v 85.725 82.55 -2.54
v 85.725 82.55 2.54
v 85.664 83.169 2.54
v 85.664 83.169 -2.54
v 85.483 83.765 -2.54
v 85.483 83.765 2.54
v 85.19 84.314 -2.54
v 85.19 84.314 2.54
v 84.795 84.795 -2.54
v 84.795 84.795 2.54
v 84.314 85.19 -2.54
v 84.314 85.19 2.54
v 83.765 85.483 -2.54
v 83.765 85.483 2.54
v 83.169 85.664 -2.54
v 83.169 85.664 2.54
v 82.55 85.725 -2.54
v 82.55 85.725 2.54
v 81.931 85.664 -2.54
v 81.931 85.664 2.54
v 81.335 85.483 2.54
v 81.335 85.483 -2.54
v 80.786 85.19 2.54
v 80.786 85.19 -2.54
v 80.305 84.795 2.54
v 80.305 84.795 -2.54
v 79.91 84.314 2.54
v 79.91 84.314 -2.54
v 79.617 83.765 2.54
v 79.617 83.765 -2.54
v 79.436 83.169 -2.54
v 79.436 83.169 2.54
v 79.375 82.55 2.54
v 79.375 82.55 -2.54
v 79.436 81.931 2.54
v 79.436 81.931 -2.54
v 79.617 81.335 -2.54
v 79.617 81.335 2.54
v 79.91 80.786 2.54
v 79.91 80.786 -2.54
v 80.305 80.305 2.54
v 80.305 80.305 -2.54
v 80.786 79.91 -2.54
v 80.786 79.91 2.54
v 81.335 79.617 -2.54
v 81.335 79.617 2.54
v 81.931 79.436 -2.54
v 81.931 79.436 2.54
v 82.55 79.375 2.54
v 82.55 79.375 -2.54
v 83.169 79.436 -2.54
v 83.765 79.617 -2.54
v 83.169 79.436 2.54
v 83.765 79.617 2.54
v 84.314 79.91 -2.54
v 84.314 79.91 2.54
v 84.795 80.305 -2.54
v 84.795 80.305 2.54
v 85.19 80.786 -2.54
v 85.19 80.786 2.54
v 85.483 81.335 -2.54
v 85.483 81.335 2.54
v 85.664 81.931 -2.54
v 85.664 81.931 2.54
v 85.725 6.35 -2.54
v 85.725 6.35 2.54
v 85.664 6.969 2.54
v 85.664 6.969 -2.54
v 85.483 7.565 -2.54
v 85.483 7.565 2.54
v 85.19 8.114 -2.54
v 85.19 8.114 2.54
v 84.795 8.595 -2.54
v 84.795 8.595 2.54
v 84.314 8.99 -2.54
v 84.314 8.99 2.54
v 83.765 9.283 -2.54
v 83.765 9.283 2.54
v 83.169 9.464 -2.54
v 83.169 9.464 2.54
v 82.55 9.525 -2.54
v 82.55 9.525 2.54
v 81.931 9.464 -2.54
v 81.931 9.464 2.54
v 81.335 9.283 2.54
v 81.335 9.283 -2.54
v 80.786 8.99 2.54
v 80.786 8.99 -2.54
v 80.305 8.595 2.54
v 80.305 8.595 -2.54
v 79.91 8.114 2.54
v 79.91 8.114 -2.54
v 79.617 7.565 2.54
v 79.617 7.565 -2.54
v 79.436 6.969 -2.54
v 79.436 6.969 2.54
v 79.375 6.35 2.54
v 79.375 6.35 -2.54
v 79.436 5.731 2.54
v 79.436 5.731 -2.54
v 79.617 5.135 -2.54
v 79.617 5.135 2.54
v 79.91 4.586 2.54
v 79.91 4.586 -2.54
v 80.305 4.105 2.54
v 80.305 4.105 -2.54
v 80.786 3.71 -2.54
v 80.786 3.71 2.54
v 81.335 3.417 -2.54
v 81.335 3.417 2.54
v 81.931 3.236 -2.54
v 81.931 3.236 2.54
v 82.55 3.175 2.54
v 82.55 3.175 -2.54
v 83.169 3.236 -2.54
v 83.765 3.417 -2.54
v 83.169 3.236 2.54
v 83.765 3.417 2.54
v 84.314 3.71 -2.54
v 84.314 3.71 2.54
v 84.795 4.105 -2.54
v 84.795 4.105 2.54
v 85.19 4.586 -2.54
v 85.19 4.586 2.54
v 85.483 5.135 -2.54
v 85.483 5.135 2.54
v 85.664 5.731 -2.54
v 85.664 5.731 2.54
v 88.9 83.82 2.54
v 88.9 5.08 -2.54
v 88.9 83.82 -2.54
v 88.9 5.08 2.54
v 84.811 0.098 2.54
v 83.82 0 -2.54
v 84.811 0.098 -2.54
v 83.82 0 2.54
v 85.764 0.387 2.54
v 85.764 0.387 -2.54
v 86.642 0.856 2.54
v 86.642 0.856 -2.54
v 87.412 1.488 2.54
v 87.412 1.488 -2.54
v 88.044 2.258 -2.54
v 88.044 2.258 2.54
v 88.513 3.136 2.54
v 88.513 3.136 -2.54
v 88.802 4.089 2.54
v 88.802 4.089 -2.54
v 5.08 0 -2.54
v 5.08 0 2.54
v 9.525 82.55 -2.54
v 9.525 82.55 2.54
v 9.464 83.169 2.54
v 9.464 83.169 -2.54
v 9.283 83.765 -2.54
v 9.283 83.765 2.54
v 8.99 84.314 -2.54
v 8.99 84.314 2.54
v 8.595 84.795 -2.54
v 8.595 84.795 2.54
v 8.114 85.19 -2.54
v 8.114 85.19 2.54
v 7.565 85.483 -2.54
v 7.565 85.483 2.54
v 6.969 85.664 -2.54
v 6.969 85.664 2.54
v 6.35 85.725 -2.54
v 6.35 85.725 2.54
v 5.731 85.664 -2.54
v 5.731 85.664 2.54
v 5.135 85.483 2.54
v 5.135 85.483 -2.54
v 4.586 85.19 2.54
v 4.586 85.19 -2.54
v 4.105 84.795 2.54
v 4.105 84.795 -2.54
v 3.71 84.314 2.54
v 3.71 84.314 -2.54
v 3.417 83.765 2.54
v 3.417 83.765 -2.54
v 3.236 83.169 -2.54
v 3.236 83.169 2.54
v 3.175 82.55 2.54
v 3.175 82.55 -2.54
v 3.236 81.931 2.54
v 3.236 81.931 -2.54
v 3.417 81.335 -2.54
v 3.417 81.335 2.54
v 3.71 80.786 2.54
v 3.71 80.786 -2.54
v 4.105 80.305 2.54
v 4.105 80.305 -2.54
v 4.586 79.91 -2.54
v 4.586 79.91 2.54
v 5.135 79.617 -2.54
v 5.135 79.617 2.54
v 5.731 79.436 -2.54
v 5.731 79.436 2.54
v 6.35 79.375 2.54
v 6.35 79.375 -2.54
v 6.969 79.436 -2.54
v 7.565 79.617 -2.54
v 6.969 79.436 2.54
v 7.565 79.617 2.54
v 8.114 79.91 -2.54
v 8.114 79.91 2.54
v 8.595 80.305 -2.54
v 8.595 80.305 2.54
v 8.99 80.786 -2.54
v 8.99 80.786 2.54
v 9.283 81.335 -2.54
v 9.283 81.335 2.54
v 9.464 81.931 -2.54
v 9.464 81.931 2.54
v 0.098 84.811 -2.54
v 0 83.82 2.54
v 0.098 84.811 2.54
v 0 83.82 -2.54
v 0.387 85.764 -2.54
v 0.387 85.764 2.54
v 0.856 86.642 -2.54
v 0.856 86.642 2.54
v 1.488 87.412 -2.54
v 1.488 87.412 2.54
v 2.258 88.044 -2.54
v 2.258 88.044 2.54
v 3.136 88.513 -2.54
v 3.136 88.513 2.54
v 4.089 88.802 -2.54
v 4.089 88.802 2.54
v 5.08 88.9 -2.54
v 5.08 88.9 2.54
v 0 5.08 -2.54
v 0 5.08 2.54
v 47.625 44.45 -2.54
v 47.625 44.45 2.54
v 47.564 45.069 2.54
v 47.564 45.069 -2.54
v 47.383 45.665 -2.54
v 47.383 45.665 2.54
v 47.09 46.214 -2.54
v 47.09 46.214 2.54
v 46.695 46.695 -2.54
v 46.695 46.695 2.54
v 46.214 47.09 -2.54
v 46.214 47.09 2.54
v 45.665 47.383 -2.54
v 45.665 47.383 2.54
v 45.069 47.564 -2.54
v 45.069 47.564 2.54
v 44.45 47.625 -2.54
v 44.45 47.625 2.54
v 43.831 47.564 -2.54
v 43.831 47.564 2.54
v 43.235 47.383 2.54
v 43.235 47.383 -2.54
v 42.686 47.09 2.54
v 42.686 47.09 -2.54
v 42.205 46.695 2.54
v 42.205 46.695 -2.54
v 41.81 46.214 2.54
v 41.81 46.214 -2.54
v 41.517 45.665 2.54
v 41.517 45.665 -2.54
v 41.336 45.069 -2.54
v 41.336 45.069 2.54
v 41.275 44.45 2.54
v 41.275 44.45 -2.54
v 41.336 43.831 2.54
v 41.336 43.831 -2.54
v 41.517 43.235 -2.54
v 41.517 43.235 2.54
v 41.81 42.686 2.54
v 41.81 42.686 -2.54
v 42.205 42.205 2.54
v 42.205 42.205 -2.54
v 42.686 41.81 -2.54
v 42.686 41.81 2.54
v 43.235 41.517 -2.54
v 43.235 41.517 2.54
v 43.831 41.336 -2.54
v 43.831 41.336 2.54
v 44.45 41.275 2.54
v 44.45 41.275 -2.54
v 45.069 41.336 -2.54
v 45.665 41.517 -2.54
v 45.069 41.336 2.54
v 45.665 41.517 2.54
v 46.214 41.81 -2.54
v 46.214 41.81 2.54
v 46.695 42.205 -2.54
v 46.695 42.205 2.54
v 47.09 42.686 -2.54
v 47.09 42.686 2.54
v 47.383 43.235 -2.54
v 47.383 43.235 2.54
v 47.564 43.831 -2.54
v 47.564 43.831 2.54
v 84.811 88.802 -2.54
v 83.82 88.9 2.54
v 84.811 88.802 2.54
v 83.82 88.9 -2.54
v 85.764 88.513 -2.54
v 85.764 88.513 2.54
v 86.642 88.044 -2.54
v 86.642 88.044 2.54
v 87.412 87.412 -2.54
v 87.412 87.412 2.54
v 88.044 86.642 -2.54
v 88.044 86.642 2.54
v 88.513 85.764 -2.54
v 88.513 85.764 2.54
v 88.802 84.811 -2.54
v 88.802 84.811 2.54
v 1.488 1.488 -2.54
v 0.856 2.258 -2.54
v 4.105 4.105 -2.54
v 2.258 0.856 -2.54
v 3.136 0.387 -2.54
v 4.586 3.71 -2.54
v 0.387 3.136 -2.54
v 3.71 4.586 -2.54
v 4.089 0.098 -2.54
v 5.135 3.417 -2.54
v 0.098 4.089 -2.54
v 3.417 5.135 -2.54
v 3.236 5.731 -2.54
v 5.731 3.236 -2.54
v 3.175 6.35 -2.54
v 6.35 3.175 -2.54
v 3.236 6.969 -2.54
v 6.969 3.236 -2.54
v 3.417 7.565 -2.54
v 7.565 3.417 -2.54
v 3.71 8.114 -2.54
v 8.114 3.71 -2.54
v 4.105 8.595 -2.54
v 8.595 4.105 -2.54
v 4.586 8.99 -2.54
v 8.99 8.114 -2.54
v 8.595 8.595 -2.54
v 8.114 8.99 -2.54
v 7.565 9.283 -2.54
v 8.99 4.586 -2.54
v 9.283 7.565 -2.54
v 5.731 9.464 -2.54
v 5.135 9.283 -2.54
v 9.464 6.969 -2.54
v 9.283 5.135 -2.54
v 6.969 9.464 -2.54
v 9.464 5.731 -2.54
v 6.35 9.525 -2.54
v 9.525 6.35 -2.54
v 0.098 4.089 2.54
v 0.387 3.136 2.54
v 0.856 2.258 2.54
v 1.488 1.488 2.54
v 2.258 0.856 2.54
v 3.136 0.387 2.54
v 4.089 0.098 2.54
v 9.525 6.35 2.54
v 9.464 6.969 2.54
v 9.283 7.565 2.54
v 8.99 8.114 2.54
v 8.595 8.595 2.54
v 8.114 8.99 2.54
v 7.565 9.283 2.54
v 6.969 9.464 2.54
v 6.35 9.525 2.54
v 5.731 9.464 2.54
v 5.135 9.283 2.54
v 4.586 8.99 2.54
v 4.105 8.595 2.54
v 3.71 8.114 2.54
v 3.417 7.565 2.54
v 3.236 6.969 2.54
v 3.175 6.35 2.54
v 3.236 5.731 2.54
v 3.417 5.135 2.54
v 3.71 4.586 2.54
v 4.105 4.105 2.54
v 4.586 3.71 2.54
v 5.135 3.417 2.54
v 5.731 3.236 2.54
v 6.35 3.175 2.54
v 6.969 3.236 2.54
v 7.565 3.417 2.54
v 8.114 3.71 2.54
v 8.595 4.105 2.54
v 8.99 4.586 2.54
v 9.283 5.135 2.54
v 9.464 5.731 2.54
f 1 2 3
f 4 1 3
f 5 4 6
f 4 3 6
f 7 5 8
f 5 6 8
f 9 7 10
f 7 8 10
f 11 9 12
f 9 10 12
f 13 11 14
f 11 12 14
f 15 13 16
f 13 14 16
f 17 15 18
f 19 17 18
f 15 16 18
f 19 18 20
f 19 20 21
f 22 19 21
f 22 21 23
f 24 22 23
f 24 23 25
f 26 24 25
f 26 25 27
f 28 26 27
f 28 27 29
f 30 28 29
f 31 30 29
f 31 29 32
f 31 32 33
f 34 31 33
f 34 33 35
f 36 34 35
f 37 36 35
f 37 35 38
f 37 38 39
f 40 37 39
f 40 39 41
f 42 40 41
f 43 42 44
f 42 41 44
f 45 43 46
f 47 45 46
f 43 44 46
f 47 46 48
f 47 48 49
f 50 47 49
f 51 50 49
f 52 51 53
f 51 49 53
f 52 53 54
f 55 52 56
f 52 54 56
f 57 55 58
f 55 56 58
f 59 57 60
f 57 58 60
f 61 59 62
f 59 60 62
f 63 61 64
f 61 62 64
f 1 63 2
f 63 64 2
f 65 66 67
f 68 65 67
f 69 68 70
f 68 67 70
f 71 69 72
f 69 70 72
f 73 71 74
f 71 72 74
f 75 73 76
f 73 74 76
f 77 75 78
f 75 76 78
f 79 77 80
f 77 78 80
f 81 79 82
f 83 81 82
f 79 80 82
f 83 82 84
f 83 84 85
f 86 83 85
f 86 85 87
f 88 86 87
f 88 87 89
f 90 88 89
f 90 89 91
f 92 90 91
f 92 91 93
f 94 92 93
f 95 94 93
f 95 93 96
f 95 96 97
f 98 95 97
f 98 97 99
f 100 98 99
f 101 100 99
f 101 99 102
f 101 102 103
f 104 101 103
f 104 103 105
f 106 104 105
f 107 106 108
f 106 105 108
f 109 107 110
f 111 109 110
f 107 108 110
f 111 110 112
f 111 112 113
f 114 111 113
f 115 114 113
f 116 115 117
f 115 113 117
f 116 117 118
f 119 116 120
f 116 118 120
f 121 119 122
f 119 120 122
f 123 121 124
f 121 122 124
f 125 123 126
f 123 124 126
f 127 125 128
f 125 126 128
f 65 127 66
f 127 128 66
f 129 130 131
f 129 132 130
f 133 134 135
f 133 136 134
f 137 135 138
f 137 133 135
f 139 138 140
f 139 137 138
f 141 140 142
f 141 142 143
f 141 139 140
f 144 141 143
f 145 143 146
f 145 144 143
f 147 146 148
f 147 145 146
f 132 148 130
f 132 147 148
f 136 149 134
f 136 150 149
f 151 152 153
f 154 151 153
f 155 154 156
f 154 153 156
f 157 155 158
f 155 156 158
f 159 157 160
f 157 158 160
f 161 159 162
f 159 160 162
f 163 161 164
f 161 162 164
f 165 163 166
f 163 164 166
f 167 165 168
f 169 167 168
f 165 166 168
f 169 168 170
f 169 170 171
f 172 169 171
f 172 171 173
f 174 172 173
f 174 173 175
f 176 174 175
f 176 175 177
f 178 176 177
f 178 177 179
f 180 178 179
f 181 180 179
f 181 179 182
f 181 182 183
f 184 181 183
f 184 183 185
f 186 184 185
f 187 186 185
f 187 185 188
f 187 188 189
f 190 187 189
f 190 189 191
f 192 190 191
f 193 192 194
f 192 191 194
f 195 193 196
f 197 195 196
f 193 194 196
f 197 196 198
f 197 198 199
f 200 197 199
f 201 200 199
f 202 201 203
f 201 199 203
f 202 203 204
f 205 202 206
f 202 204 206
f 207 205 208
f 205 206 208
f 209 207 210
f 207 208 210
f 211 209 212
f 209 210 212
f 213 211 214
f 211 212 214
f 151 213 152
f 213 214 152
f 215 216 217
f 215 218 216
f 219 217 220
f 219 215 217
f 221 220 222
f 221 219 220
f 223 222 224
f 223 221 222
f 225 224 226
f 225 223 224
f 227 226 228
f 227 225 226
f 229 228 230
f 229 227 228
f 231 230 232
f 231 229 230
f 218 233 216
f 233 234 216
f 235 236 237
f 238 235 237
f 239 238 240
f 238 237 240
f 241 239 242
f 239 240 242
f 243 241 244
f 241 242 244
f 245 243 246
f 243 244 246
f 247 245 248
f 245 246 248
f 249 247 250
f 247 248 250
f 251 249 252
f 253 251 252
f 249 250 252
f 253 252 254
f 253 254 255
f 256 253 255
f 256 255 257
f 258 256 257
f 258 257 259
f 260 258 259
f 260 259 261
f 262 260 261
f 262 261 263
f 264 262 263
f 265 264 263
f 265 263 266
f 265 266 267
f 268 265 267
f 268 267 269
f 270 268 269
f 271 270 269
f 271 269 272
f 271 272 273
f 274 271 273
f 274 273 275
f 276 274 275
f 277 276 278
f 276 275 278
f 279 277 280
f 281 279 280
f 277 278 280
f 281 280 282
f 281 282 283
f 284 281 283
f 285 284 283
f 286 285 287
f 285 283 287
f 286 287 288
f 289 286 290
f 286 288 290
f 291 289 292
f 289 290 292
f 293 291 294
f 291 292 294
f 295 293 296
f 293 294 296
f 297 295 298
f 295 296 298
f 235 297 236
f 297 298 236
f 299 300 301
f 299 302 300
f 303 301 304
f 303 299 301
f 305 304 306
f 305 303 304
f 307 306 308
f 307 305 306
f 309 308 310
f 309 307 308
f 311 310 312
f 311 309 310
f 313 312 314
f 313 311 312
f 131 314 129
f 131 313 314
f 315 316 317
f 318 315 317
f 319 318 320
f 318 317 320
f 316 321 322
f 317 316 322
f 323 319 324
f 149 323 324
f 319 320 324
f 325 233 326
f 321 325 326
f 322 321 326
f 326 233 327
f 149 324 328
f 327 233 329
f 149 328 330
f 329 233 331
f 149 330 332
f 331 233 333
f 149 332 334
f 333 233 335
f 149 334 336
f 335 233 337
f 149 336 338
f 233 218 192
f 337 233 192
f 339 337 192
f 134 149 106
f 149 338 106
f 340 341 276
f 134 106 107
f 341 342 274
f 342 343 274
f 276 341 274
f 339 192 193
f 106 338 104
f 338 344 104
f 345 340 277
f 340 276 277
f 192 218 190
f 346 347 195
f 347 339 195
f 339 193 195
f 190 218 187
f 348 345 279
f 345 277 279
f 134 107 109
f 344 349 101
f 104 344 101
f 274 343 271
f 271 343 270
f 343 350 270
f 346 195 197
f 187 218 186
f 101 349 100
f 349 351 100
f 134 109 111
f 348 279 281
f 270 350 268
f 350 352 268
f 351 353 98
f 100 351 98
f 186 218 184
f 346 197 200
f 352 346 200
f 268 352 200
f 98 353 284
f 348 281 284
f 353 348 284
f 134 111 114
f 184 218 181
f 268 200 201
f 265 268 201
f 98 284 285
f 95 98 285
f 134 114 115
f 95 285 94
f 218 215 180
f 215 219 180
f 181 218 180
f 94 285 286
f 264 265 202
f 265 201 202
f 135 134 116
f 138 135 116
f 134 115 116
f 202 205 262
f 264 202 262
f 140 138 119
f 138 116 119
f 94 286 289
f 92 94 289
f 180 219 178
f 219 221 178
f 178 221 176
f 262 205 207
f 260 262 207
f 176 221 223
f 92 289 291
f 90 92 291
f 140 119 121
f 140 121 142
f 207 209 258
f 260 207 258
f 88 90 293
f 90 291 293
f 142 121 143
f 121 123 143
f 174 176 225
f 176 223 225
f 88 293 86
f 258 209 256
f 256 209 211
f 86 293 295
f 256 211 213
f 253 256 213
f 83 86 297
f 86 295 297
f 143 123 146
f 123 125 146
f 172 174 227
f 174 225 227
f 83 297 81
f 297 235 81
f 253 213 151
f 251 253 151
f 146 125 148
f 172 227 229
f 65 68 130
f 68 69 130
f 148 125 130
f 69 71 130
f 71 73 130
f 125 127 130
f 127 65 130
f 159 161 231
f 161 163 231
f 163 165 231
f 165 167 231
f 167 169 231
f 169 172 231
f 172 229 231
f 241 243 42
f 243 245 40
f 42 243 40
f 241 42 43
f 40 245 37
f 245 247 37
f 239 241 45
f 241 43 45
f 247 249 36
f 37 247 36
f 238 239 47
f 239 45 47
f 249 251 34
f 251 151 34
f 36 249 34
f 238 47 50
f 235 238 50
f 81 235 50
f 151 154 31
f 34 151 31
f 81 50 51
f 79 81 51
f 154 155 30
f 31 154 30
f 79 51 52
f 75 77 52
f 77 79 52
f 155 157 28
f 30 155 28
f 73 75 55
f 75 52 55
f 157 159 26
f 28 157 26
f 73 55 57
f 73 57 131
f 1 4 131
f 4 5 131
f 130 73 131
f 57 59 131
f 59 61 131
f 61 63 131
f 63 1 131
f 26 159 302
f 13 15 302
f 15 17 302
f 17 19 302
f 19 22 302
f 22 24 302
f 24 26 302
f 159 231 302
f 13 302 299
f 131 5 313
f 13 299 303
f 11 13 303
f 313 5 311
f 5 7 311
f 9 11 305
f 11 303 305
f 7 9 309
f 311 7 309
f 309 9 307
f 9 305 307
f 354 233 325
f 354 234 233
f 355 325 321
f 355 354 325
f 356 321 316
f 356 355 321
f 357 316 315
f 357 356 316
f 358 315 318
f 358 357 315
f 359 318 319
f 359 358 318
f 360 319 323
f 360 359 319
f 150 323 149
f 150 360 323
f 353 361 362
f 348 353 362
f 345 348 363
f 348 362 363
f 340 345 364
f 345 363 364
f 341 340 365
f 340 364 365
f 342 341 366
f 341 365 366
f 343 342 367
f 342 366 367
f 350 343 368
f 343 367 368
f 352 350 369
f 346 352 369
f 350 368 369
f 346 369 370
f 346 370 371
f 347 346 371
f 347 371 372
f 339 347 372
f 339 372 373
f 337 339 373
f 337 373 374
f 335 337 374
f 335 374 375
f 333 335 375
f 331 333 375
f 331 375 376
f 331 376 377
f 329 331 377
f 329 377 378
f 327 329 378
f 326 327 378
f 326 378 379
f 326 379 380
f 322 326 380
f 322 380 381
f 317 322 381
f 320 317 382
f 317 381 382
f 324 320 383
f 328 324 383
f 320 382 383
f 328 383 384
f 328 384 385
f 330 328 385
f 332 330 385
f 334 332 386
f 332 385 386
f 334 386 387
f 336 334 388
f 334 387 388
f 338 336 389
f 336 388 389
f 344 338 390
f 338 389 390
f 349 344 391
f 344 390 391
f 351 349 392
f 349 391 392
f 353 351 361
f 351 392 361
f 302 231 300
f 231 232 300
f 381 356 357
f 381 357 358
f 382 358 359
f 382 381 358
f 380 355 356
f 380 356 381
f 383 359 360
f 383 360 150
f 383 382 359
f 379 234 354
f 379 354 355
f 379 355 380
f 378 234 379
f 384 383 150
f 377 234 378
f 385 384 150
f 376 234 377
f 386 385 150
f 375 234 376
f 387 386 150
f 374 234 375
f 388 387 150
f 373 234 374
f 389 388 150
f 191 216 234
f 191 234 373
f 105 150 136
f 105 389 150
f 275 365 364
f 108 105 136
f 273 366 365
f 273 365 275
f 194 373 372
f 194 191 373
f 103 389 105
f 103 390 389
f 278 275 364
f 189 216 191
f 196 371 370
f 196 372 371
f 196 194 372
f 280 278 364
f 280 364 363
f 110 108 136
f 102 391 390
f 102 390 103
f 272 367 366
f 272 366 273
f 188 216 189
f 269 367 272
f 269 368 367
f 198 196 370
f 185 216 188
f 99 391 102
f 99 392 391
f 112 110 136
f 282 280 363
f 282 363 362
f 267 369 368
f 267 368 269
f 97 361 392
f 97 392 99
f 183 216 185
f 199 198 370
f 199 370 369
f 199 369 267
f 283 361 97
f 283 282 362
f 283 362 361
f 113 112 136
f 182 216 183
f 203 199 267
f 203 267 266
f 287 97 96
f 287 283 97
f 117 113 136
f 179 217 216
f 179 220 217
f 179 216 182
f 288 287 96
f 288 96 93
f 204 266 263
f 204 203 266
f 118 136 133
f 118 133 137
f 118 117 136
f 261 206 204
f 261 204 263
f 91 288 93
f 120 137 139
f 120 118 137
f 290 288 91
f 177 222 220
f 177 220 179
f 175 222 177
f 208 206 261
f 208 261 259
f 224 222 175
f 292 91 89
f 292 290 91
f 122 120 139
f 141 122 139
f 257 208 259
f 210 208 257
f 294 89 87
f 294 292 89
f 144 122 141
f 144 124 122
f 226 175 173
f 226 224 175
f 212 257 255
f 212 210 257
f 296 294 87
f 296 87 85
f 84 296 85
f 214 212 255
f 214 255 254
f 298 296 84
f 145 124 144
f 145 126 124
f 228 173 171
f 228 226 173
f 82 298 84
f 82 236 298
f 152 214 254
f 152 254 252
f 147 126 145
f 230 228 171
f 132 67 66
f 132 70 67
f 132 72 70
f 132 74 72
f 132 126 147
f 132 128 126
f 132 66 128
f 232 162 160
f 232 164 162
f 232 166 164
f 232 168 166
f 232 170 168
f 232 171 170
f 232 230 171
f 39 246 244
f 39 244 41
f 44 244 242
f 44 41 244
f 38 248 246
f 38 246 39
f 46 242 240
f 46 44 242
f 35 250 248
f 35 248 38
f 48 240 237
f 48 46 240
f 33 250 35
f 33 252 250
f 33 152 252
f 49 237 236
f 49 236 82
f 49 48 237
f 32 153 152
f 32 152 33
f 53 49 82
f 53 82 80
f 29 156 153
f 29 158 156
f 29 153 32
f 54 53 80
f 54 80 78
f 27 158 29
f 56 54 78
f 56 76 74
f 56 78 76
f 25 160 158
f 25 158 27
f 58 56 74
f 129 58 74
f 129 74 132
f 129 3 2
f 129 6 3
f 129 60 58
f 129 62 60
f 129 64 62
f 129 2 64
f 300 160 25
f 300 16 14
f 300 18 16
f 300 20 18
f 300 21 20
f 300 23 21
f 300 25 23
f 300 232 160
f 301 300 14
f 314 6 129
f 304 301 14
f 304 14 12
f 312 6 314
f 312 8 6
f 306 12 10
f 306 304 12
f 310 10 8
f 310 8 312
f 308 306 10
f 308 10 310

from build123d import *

# Parameters (mm, degrees)
SKETCH1_W           = 88.9
SKETCH1_H           = 88.9
BOSS_EXTRUDE1_DEPTH = 2.54
SKETCH2_R           = 3.175
CUT_EXTRUDE1_DEPTH  = 6.08
FILLET1_R           = 5.08


with BuildPart() as part:
    # Sketch1 → Boss-Extrude1 (new body, symmetric)
    with BuildSketch(Plane.XY):
        with Locations((44.45, 44.45)):
            Rectangle(SKETCH1_W, SKETCH1_H)
    extrude(amount=BOSS_EXTRUDE1_DEPTH, both=True)

    # Sketch2 → Cut-Extrude1 (cut, through all)
    with BuildSketch(Plane.XY.offset(2.54)):
        with Locations((6.35, 82.55)):
            Circle(SKETCH2_R)
        with Locations((82.55, 82.55)):
            Circle(SKETCH2_R)
        with Locations((82.55, 6.35)):
            Circle(SKETCH2_R)
        with Locations((6.35, 6.35)):
            Circle(SKETCH2_R)
        with Locations((44.45, 44.45)):
            Circle(SKETCH2_R)
    extrude(amount=-CUT_EXTRUDE1_DEPTH, mode=Mode.SUBTRACT)

    # Fillet1
    fillet1_edges = [part.edges().sort_by_distance(p)[0] for p in [
        (0, 88.9, 0),
        (88.9, 88.9, 0),
        (88.9, 0, 0),
        (0, 0, 0),
    ]]
    fillet(fillet1_edges, radius=FILLET1_R)


solid = part.part
